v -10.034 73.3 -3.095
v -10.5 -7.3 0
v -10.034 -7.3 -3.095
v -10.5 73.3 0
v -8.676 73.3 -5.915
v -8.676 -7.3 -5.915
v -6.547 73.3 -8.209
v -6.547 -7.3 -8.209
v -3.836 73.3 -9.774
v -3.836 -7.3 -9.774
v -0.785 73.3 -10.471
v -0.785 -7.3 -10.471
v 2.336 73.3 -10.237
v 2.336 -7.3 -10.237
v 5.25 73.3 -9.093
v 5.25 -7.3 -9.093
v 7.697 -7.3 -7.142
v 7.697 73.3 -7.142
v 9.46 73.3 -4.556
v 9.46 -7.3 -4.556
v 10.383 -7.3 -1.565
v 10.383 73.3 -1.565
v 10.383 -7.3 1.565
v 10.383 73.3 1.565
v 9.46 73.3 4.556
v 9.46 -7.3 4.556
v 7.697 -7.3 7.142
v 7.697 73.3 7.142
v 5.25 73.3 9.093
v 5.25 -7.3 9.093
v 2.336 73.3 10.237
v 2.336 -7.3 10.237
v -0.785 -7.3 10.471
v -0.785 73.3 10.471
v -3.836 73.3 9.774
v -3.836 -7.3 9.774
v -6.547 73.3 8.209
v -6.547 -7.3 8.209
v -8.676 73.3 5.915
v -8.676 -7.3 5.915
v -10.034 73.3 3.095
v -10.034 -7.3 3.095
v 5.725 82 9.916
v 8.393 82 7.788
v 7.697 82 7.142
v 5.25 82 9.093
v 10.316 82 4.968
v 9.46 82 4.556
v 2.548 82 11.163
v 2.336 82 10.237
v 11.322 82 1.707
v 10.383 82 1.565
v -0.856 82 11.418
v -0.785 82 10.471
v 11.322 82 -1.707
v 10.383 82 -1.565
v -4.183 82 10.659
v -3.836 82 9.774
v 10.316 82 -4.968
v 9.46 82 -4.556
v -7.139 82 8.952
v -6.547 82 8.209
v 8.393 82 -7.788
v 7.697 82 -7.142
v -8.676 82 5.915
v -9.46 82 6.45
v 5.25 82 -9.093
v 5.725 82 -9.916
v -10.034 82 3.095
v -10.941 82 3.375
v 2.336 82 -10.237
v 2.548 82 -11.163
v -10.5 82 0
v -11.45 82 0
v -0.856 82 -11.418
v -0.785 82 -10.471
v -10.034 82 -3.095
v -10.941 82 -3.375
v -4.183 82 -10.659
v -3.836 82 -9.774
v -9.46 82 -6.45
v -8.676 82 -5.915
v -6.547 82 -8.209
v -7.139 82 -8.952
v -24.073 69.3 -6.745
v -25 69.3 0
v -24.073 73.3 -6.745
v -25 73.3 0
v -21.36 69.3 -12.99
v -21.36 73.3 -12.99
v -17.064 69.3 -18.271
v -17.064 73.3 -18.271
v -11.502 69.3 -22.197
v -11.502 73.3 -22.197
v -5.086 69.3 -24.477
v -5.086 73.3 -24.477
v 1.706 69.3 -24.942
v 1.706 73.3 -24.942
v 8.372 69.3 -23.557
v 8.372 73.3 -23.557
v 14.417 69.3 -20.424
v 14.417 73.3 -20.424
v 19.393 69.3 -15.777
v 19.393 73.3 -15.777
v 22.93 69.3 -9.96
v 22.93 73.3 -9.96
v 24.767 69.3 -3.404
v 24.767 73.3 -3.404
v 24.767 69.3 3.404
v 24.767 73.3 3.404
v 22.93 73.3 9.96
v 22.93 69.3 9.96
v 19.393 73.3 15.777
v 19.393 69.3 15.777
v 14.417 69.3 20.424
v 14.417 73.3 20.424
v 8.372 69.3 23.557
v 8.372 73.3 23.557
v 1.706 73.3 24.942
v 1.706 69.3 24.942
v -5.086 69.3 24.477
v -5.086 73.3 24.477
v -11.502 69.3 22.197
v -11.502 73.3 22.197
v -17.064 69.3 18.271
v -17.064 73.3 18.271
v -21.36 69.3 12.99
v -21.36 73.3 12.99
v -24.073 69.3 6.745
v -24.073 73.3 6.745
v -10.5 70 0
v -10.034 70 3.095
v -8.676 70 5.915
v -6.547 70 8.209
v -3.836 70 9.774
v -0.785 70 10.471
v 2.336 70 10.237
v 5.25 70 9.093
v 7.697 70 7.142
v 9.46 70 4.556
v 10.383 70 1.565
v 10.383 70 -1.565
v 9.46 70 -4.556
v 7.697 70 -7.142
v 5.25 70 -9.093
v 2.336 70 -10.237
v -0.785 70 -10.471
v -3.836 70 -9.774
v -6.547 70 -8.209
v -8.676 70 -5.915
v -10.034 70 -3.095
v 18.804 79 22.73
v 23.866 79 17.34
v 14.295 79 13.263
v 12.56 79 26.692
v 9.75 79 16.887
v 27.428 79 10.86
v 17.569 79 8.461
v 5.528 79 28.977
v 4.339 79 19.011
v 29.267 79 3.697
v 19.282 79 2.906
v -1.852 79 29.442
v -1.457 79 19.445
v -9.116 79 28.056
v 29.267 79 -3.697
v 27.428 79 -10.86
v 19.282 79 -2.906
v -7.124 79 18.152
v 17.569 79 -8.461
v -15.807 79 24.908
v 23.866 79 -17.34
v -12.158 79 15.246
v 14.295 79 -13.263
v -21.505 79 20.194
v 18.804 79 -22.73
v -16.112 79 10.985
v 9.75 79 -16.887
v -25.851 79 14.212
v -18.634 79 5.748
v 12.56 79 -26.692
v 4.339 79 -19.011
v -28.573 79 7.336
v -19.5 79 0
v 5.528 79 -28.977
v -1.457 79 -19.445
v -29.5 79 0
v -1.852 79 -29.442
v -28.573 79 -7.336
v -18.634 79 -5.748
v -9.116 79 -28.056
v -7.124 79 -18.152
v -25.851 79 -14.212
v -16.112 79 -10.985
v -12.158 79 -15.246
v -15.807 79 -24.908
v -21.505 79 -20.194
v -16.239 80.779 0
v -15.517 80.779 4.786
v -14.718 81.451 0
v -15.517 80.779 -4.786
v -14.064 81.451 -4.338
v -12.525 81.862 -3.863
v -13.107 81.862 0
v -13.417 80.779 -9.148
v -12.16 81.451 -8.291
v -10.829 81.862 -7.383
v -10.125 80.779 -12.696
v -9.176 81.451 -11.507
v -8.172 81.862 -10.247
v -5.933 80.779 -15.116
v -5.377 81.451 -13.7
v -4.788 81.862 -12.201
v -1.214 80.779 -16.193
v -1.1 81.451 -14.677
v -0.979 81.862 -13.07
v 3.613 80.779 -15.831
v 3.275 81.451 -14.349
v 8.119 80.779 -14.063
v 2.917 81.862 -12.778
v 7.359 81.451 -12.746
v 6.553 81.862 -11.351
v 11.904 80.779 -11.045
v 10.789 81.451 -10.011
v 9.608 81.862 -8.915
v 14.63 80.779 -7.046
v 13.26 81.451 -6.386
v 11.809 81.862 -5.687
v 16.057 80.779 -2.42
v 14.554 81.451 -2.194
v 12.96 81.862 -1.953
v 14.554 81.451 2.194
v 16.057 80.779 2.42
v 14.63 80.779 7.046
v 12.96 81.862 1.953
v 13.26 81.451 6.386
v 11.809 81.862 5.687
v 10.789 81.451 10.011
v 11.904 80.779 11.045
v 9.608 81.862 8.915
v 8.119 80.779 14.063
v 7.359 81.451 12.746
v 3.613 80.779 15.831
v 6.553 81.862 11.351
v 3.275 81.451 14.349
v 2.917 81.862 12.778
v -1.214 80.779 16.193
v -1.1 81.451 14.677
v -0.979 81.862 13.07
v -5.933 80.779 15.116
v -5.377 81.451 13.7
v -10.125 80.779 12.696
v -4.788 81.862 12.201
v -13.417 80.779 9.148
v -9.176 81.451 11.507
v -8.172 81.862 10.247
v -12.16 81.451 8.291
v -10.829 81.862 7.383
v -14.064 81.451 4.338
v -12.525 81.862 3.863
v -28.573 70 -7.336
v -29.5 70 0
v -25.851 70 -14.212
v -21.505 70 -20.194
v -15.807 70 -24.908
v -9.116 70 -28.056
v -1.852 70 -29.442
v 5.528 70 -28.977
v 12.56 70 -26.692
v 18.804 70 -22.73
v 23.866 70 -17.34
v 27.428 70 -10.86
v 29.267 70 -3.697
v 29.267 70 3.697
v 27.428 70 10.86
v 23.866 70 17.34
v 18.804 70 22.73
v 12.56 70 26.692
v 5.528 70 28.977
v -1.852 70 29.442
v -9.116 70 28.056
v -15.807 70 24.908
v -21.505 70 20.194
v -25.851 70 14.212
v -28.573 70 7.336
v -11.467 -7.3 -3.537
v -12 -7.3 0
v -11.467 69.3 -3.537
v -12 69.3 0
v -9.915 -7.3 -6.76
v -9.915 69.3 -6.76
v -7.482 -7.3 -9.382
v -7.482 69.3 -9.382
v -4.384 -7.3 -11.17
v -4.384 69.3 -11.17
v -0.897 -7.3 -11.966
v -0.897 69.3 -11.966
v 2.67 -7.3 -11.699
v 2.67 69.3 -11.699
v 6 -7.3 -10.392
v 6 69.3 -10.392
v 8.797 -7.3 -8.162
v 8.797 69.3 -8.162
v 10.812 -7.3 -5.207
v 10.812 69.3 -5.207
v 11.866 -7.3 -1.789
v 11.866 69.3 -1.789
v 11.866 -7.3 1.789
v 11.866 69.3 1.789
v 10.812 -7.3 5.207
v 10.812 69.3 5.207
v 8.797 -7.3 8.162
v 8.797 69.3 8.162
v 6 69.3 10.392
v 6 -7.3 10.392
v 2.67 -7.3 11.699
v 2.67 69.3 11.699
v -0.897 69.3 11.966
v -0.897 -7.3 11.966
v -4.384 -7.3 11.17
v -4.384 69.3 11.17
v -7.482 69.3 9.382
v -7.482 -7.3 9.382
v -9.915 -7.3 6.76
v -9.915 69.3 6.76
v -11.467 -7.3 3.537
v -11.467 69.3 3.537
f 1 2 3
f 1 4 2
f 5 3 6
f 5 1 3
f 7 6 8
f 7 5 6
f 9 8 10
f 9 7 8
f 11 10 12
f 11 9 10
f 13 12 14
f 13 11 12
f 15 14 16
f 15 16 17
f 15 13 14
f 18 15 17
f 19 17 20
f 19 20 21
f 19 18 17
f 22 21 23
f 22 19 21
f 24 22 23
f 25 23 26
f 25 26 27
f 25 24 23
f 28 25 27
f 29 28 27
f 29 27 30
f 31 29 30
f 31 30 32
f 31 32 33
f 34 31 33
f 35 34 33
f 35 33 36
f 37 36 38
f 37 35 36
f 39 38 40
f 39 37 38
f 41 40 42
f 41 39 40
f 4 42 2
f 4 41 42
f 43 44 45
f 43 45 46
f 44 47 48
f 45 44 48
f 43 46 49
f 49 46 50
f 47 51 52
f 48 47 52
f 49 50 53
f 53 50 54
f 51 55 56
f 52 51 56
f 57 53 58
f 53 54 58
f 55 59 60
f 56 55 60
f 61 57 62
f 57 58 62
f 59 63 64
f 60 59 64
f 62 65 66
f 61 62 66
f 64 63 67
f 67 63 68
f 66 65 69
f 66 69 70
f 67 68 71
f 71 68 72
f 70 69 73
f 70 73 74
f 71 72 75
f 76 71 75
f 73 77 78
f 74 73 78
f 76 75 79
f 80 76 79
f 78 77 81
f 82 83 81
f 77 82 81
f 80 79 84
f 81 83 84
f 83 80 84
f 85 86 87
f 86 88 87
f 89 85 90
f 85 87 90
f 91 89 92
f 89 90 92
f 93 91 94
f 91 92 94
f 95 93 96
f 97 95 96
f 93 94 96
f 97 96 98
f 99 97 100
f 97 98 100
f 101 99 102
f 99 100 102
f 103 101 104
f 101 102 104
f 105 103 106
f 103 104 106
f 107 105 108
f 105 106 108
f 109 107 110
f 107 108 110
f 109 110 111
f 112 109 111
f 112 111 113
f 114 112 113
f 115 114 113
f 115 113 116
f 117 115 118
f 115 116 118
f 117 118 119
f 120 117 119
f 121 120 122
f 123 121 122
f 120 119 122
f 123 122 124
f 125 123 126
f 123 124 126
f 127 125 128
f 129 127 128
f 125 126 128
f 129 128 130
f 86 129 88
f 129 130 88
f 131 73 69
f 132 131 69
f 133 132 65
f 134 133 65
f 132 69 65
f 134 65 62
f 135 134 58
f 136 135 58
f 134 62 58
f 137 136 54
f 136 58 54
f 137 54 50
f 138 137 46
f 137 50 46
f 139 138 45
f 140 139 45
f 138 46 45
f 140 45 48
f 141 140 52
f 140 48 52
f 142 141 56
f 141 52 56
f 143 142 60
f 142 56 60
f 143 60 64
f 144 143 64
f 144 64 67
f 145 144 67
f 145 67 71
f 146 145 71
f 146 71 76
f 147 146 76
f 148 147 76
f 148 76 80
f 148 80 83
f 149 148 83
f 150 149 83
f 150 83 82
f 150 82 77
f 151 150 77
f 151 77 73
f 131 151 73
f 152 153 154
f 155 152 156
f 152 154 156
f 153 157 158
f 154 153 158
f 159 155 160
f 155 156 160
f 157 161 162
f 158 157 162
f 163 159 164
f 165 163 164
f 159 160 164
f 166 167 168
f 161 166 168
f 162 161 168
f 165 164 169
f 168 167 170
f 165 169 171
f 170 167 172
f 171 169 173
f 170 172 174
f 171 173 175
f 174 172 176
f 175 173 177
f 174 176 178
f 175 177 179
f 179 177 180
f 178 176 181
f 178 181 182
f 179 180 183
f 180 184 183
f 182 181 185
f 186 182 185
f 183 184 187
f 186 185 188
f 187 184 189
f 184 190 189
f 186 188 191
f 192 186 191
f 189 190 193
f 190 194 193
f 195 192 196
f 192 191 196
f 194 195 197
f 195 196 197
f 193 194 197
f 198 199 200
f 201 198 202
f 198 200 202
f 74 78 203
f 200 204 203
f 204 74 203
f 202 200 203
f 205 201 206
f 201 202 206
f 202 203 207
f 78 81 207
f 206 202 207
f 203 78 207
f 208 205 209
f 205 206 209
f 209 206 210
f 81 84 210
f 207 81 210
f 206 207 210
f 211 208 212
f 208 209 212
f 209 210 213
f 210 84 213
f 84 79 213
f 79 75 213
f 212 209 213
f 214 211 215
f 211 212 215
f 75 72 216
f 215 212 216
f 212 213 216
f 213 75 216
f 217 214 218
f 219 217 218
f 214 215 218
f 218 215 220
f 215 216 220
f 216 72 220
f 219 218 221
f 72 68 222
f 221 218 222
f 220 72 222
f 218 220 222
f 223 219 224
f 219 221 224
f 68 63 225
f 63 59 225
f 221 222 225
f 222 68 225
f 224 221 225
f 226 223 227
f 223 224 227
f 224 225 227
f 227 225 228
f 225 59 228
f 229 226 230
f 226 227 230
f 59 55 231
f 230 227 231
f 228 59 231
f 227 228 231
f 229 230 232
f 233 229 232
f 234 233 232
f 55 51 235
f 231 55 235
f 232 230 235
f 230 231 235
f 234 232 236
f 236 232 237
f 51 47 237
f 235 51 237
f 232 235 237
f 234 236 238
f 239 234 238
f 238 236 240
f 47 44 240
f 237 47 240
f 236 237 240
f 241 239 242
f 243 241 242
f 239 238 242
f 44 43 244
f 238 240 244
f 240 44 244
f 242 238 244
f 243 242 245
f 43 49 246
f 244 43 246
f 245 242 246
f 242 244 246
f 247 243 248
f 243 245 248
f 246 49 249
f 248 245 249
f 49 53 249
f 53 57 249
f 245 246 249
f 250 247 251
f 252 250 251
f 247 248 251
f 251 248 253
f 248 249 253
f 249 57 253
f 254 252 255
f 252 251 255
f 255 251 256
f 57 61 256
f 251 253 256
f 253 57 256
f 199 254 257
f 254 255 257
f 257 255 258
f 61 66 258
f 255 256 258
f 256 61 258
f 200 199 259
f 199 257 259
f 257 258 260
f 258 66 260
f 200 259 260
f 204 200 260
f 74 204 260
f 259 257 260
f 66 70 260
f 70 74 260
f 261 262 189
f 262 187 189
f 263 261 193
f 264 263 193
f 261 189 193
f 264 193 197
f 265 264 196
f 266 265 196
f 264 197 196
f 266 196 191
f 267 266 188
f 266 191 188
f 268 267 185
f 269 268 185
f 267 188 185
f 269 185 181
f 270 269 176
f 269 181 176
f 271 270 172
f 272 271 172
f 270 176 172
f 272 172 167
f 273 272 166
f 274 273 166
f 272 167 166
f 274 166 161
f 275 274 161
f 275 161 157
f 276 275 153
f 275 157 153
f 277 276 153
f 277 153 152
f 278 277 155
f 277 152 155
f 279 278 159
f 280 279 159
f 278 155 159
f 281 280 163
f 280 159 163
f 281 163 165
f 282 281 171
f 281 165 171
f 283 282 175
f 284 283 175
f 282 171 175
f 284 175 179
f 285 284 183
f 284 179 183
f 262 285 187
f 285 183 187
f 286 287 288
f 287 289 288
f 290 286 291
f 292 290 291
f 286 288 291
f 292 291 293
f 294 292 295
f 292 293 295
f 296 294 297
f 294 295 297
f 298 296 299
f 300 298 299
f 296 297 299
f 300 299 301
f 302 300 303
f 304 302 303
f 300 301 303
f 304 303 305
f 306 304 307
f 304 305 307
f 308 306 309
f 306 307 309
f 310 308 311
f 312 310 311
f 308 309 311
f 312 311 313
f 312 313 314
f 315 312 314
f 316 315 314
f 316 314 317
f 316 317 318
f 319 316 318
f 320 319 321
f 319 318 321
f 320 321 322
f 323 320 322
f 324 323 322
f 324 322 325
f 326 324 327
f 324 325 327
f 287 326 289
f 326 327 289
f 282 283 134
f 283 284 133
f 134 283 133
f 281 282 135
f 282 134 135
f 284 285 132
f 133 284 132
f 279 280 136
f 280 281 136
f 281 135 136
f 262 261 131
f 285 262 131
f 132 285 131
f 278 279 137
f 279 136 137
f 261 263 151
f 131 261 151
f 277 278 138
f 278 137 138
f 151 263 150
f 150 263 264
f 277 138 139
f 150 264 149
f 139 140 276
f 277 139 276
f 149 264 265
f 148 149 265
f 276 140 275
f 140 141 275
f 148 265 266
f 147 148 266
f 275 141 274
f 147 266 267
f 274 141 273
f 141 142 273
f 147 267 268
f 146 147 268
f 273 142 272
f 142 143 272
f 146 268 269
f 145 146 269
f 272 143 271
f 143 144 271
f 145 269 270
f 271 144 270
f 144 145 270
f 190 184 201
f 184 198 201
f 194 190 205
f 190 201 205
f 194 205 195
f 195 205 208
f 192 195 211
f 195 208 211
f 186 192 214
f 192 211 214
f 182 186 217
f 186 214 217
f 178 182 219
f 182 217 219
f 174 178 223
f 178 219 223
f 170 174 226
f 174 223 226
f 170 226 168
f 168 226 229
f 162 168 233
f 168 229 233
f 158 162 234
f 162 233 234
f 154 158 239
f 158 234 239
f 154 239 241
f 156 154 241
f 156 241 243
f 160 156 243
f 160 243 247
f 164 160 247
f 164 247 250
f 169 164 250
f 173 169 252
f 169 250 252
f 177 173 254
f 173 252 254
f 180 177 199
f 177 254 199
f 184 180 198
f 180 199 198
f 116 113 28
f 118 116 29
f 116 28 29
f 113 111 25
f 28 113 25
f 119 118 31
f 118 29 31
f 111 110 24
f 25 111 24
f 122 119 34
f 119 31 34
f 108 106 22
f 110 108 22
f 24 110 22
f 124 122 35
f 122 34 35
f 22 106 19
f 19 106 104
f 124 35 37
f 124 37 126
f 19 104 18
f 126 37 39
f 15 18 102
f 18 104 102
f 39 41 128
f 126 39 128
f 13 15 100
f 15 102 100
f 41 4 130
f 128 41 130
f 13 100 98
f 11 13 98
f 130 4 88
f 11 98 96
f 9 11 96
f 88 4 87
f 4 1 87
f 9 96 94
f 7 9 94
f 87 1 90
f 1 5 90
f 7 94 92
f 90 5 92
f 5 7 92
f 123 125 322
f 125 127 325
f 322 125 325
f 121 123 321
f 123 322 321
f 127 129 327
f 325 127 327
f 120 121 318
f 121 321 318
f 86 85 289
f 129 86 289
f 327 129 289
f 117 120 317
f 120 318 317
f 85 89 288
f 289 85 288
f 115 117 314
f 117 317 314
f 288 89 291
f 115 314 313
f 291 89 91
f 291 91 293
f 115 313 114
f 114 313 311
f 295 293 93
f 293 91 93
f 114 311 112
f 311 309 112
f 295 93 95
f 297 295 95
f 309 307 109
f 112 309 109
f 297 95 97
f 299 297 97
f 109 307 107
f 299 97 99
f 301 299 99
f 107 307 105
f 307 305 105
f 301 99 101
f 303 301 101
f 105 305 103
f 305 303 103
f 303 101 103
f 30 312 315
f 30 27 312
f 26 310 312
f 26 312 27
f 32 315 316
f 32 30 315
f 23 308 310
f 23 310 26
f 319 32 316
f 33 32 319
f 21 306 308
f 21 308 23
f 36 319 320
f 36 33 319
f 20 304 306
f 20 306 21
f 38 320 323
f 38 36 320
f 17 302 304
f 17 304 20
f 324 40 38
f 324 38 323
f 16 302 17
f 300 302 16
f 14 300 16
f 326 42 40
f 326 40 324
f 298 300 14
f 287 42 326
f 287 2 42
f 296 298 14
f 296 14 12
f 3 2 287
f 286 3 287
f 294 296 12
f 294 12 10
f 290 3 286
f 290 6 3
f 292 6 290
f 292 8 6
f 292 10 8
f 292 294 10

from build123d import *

# Parameters (mm, degrees)
CROQUIS3_W              = 28.5
CROQUIS3_H              = 7.3
REDONDEO1_R             = 2
CROQUIS7_R              = 10.5
CORTAR_EXTRUIR2_DEPTH   = 93.002717351
CROQUIS8_R              = 12
CROQUIS8_R_2            = 10.5
SALIENTE_EXTRUIR1_DEPTH = 7.3


with BuildPart() as part:
    # Croquis1 → Revolución1 (revolve)
    with BuildSketch(Plane.XY, mode=Mode.PRIVATE) as revoluci_n1_sk:
        Polygon((12, 0), (12, 69.3), (25, 69.3), (25, 73.3), (0, 73.3), (0, 0), align=None)
    revolve(revoluci_n1_sk.sketch.rotate(Axis((0, 73.3, 0), (0, -1, 0)), 180), axis=Axis((0, 73.3, 0), (0, -1, 0)))


with BuildPart() as body_2:
    # Croquis3 → Revolución2 (revolve)
    with BuildSketch(Plane.XY, mode=Mode.PRIVATE) as revoluci_n2_sk:
        with Locations((14.25, 73.65)):
            Rectangle(CROQUIS3_W, CROQUIS3_H)
    revolve(revoluci_n2_sk.sketch.rotate(Axis((0, 70, 0), (0, 1, 0)), 90), axis=Axis((0, 70, 0), (0, 1, 0)))

    # Redondeo1
    redondeo1_edges = [body_2.edges().sort_by_distance(p)[0] for p in [
        (0, 77.3, 28.5),
    ]]
    fillet(redondeo1_edges, radius=REDONDEO1_R)

    # Croquis6 → Revolución4 (revolve)
    with BuildSketch(Plane.XY, mode=Mode.PRIVATE) as revoluci_n4_sk:
        with BuildLine():
            Line((0, 70), (29.5, 70))
            Line((29.5, 70), (29.5, 79))
            Line((29.5, 79), (19.5, 79))
            Line((19.5, 79), (16.238581163, 80.778955729))
            ThreePointArc((16.238581163, 80.778955729), (13.92093447, 81.689931818), (11.450059856, 82))
            Line((11.450059856, 82), (0, 82))
            Line((0, 82), (0, 70))
        make_face()
    revolve(revoluci_n4_sk.sketch.rotate(Axis((0, 82, 0), (0, -1, 0)), 180), axis=Axis((0, 82, 0), (0, -1, 0)))


with BuildPart() as cortar_extruir2_tool:
    # Croquis7 → Cortar-Extruir2 (new, through all)
    with BuildSketch(Plane(origin=(0, 82, 0), x_dir=(1, 0, 0), z_dir=(0, 1, 0))):
        with Locations(Location((0, 0, 0), (0, 0, 180))):
            Circle(CROQUIS7_R)
    extrude(amount=-CORTAR_EXTRUIR2_DEPTH)


with BuildPart() as part_1:
    add(part.part)

    # Cortar-Extruir2: cut by cortar_extruir2_tool
    add(cortar_extruir2_tool.part, mode=Mode.SUBTRACT)

    # Croquis8 → Saliente-Extruir1 (add)
    with BuildSketch(Plane.XZ):
        with Locations(Location((0, 0, 0), (0, 0, 180))):
            Circle(CROQUIS8_R)
        with Locations(Location((0, 0, 0), (0, 0, 180))):
            Circle(CROQUIS8_R_2, mode=Mode.SUBTRACT)
    extrude(amount=SALIENTE_EXTRUIR1_DEPTH)


with BuildPart() as body_2_1:
    add(body_2.part)

    # Cortar-Extruir2: cut by cortar_extruir2_tool
    add(cortar_extruir2_tool.part, mode=Mode.SUBTRACT)


solid = Compound([part_1.part, body_2_1.part])
